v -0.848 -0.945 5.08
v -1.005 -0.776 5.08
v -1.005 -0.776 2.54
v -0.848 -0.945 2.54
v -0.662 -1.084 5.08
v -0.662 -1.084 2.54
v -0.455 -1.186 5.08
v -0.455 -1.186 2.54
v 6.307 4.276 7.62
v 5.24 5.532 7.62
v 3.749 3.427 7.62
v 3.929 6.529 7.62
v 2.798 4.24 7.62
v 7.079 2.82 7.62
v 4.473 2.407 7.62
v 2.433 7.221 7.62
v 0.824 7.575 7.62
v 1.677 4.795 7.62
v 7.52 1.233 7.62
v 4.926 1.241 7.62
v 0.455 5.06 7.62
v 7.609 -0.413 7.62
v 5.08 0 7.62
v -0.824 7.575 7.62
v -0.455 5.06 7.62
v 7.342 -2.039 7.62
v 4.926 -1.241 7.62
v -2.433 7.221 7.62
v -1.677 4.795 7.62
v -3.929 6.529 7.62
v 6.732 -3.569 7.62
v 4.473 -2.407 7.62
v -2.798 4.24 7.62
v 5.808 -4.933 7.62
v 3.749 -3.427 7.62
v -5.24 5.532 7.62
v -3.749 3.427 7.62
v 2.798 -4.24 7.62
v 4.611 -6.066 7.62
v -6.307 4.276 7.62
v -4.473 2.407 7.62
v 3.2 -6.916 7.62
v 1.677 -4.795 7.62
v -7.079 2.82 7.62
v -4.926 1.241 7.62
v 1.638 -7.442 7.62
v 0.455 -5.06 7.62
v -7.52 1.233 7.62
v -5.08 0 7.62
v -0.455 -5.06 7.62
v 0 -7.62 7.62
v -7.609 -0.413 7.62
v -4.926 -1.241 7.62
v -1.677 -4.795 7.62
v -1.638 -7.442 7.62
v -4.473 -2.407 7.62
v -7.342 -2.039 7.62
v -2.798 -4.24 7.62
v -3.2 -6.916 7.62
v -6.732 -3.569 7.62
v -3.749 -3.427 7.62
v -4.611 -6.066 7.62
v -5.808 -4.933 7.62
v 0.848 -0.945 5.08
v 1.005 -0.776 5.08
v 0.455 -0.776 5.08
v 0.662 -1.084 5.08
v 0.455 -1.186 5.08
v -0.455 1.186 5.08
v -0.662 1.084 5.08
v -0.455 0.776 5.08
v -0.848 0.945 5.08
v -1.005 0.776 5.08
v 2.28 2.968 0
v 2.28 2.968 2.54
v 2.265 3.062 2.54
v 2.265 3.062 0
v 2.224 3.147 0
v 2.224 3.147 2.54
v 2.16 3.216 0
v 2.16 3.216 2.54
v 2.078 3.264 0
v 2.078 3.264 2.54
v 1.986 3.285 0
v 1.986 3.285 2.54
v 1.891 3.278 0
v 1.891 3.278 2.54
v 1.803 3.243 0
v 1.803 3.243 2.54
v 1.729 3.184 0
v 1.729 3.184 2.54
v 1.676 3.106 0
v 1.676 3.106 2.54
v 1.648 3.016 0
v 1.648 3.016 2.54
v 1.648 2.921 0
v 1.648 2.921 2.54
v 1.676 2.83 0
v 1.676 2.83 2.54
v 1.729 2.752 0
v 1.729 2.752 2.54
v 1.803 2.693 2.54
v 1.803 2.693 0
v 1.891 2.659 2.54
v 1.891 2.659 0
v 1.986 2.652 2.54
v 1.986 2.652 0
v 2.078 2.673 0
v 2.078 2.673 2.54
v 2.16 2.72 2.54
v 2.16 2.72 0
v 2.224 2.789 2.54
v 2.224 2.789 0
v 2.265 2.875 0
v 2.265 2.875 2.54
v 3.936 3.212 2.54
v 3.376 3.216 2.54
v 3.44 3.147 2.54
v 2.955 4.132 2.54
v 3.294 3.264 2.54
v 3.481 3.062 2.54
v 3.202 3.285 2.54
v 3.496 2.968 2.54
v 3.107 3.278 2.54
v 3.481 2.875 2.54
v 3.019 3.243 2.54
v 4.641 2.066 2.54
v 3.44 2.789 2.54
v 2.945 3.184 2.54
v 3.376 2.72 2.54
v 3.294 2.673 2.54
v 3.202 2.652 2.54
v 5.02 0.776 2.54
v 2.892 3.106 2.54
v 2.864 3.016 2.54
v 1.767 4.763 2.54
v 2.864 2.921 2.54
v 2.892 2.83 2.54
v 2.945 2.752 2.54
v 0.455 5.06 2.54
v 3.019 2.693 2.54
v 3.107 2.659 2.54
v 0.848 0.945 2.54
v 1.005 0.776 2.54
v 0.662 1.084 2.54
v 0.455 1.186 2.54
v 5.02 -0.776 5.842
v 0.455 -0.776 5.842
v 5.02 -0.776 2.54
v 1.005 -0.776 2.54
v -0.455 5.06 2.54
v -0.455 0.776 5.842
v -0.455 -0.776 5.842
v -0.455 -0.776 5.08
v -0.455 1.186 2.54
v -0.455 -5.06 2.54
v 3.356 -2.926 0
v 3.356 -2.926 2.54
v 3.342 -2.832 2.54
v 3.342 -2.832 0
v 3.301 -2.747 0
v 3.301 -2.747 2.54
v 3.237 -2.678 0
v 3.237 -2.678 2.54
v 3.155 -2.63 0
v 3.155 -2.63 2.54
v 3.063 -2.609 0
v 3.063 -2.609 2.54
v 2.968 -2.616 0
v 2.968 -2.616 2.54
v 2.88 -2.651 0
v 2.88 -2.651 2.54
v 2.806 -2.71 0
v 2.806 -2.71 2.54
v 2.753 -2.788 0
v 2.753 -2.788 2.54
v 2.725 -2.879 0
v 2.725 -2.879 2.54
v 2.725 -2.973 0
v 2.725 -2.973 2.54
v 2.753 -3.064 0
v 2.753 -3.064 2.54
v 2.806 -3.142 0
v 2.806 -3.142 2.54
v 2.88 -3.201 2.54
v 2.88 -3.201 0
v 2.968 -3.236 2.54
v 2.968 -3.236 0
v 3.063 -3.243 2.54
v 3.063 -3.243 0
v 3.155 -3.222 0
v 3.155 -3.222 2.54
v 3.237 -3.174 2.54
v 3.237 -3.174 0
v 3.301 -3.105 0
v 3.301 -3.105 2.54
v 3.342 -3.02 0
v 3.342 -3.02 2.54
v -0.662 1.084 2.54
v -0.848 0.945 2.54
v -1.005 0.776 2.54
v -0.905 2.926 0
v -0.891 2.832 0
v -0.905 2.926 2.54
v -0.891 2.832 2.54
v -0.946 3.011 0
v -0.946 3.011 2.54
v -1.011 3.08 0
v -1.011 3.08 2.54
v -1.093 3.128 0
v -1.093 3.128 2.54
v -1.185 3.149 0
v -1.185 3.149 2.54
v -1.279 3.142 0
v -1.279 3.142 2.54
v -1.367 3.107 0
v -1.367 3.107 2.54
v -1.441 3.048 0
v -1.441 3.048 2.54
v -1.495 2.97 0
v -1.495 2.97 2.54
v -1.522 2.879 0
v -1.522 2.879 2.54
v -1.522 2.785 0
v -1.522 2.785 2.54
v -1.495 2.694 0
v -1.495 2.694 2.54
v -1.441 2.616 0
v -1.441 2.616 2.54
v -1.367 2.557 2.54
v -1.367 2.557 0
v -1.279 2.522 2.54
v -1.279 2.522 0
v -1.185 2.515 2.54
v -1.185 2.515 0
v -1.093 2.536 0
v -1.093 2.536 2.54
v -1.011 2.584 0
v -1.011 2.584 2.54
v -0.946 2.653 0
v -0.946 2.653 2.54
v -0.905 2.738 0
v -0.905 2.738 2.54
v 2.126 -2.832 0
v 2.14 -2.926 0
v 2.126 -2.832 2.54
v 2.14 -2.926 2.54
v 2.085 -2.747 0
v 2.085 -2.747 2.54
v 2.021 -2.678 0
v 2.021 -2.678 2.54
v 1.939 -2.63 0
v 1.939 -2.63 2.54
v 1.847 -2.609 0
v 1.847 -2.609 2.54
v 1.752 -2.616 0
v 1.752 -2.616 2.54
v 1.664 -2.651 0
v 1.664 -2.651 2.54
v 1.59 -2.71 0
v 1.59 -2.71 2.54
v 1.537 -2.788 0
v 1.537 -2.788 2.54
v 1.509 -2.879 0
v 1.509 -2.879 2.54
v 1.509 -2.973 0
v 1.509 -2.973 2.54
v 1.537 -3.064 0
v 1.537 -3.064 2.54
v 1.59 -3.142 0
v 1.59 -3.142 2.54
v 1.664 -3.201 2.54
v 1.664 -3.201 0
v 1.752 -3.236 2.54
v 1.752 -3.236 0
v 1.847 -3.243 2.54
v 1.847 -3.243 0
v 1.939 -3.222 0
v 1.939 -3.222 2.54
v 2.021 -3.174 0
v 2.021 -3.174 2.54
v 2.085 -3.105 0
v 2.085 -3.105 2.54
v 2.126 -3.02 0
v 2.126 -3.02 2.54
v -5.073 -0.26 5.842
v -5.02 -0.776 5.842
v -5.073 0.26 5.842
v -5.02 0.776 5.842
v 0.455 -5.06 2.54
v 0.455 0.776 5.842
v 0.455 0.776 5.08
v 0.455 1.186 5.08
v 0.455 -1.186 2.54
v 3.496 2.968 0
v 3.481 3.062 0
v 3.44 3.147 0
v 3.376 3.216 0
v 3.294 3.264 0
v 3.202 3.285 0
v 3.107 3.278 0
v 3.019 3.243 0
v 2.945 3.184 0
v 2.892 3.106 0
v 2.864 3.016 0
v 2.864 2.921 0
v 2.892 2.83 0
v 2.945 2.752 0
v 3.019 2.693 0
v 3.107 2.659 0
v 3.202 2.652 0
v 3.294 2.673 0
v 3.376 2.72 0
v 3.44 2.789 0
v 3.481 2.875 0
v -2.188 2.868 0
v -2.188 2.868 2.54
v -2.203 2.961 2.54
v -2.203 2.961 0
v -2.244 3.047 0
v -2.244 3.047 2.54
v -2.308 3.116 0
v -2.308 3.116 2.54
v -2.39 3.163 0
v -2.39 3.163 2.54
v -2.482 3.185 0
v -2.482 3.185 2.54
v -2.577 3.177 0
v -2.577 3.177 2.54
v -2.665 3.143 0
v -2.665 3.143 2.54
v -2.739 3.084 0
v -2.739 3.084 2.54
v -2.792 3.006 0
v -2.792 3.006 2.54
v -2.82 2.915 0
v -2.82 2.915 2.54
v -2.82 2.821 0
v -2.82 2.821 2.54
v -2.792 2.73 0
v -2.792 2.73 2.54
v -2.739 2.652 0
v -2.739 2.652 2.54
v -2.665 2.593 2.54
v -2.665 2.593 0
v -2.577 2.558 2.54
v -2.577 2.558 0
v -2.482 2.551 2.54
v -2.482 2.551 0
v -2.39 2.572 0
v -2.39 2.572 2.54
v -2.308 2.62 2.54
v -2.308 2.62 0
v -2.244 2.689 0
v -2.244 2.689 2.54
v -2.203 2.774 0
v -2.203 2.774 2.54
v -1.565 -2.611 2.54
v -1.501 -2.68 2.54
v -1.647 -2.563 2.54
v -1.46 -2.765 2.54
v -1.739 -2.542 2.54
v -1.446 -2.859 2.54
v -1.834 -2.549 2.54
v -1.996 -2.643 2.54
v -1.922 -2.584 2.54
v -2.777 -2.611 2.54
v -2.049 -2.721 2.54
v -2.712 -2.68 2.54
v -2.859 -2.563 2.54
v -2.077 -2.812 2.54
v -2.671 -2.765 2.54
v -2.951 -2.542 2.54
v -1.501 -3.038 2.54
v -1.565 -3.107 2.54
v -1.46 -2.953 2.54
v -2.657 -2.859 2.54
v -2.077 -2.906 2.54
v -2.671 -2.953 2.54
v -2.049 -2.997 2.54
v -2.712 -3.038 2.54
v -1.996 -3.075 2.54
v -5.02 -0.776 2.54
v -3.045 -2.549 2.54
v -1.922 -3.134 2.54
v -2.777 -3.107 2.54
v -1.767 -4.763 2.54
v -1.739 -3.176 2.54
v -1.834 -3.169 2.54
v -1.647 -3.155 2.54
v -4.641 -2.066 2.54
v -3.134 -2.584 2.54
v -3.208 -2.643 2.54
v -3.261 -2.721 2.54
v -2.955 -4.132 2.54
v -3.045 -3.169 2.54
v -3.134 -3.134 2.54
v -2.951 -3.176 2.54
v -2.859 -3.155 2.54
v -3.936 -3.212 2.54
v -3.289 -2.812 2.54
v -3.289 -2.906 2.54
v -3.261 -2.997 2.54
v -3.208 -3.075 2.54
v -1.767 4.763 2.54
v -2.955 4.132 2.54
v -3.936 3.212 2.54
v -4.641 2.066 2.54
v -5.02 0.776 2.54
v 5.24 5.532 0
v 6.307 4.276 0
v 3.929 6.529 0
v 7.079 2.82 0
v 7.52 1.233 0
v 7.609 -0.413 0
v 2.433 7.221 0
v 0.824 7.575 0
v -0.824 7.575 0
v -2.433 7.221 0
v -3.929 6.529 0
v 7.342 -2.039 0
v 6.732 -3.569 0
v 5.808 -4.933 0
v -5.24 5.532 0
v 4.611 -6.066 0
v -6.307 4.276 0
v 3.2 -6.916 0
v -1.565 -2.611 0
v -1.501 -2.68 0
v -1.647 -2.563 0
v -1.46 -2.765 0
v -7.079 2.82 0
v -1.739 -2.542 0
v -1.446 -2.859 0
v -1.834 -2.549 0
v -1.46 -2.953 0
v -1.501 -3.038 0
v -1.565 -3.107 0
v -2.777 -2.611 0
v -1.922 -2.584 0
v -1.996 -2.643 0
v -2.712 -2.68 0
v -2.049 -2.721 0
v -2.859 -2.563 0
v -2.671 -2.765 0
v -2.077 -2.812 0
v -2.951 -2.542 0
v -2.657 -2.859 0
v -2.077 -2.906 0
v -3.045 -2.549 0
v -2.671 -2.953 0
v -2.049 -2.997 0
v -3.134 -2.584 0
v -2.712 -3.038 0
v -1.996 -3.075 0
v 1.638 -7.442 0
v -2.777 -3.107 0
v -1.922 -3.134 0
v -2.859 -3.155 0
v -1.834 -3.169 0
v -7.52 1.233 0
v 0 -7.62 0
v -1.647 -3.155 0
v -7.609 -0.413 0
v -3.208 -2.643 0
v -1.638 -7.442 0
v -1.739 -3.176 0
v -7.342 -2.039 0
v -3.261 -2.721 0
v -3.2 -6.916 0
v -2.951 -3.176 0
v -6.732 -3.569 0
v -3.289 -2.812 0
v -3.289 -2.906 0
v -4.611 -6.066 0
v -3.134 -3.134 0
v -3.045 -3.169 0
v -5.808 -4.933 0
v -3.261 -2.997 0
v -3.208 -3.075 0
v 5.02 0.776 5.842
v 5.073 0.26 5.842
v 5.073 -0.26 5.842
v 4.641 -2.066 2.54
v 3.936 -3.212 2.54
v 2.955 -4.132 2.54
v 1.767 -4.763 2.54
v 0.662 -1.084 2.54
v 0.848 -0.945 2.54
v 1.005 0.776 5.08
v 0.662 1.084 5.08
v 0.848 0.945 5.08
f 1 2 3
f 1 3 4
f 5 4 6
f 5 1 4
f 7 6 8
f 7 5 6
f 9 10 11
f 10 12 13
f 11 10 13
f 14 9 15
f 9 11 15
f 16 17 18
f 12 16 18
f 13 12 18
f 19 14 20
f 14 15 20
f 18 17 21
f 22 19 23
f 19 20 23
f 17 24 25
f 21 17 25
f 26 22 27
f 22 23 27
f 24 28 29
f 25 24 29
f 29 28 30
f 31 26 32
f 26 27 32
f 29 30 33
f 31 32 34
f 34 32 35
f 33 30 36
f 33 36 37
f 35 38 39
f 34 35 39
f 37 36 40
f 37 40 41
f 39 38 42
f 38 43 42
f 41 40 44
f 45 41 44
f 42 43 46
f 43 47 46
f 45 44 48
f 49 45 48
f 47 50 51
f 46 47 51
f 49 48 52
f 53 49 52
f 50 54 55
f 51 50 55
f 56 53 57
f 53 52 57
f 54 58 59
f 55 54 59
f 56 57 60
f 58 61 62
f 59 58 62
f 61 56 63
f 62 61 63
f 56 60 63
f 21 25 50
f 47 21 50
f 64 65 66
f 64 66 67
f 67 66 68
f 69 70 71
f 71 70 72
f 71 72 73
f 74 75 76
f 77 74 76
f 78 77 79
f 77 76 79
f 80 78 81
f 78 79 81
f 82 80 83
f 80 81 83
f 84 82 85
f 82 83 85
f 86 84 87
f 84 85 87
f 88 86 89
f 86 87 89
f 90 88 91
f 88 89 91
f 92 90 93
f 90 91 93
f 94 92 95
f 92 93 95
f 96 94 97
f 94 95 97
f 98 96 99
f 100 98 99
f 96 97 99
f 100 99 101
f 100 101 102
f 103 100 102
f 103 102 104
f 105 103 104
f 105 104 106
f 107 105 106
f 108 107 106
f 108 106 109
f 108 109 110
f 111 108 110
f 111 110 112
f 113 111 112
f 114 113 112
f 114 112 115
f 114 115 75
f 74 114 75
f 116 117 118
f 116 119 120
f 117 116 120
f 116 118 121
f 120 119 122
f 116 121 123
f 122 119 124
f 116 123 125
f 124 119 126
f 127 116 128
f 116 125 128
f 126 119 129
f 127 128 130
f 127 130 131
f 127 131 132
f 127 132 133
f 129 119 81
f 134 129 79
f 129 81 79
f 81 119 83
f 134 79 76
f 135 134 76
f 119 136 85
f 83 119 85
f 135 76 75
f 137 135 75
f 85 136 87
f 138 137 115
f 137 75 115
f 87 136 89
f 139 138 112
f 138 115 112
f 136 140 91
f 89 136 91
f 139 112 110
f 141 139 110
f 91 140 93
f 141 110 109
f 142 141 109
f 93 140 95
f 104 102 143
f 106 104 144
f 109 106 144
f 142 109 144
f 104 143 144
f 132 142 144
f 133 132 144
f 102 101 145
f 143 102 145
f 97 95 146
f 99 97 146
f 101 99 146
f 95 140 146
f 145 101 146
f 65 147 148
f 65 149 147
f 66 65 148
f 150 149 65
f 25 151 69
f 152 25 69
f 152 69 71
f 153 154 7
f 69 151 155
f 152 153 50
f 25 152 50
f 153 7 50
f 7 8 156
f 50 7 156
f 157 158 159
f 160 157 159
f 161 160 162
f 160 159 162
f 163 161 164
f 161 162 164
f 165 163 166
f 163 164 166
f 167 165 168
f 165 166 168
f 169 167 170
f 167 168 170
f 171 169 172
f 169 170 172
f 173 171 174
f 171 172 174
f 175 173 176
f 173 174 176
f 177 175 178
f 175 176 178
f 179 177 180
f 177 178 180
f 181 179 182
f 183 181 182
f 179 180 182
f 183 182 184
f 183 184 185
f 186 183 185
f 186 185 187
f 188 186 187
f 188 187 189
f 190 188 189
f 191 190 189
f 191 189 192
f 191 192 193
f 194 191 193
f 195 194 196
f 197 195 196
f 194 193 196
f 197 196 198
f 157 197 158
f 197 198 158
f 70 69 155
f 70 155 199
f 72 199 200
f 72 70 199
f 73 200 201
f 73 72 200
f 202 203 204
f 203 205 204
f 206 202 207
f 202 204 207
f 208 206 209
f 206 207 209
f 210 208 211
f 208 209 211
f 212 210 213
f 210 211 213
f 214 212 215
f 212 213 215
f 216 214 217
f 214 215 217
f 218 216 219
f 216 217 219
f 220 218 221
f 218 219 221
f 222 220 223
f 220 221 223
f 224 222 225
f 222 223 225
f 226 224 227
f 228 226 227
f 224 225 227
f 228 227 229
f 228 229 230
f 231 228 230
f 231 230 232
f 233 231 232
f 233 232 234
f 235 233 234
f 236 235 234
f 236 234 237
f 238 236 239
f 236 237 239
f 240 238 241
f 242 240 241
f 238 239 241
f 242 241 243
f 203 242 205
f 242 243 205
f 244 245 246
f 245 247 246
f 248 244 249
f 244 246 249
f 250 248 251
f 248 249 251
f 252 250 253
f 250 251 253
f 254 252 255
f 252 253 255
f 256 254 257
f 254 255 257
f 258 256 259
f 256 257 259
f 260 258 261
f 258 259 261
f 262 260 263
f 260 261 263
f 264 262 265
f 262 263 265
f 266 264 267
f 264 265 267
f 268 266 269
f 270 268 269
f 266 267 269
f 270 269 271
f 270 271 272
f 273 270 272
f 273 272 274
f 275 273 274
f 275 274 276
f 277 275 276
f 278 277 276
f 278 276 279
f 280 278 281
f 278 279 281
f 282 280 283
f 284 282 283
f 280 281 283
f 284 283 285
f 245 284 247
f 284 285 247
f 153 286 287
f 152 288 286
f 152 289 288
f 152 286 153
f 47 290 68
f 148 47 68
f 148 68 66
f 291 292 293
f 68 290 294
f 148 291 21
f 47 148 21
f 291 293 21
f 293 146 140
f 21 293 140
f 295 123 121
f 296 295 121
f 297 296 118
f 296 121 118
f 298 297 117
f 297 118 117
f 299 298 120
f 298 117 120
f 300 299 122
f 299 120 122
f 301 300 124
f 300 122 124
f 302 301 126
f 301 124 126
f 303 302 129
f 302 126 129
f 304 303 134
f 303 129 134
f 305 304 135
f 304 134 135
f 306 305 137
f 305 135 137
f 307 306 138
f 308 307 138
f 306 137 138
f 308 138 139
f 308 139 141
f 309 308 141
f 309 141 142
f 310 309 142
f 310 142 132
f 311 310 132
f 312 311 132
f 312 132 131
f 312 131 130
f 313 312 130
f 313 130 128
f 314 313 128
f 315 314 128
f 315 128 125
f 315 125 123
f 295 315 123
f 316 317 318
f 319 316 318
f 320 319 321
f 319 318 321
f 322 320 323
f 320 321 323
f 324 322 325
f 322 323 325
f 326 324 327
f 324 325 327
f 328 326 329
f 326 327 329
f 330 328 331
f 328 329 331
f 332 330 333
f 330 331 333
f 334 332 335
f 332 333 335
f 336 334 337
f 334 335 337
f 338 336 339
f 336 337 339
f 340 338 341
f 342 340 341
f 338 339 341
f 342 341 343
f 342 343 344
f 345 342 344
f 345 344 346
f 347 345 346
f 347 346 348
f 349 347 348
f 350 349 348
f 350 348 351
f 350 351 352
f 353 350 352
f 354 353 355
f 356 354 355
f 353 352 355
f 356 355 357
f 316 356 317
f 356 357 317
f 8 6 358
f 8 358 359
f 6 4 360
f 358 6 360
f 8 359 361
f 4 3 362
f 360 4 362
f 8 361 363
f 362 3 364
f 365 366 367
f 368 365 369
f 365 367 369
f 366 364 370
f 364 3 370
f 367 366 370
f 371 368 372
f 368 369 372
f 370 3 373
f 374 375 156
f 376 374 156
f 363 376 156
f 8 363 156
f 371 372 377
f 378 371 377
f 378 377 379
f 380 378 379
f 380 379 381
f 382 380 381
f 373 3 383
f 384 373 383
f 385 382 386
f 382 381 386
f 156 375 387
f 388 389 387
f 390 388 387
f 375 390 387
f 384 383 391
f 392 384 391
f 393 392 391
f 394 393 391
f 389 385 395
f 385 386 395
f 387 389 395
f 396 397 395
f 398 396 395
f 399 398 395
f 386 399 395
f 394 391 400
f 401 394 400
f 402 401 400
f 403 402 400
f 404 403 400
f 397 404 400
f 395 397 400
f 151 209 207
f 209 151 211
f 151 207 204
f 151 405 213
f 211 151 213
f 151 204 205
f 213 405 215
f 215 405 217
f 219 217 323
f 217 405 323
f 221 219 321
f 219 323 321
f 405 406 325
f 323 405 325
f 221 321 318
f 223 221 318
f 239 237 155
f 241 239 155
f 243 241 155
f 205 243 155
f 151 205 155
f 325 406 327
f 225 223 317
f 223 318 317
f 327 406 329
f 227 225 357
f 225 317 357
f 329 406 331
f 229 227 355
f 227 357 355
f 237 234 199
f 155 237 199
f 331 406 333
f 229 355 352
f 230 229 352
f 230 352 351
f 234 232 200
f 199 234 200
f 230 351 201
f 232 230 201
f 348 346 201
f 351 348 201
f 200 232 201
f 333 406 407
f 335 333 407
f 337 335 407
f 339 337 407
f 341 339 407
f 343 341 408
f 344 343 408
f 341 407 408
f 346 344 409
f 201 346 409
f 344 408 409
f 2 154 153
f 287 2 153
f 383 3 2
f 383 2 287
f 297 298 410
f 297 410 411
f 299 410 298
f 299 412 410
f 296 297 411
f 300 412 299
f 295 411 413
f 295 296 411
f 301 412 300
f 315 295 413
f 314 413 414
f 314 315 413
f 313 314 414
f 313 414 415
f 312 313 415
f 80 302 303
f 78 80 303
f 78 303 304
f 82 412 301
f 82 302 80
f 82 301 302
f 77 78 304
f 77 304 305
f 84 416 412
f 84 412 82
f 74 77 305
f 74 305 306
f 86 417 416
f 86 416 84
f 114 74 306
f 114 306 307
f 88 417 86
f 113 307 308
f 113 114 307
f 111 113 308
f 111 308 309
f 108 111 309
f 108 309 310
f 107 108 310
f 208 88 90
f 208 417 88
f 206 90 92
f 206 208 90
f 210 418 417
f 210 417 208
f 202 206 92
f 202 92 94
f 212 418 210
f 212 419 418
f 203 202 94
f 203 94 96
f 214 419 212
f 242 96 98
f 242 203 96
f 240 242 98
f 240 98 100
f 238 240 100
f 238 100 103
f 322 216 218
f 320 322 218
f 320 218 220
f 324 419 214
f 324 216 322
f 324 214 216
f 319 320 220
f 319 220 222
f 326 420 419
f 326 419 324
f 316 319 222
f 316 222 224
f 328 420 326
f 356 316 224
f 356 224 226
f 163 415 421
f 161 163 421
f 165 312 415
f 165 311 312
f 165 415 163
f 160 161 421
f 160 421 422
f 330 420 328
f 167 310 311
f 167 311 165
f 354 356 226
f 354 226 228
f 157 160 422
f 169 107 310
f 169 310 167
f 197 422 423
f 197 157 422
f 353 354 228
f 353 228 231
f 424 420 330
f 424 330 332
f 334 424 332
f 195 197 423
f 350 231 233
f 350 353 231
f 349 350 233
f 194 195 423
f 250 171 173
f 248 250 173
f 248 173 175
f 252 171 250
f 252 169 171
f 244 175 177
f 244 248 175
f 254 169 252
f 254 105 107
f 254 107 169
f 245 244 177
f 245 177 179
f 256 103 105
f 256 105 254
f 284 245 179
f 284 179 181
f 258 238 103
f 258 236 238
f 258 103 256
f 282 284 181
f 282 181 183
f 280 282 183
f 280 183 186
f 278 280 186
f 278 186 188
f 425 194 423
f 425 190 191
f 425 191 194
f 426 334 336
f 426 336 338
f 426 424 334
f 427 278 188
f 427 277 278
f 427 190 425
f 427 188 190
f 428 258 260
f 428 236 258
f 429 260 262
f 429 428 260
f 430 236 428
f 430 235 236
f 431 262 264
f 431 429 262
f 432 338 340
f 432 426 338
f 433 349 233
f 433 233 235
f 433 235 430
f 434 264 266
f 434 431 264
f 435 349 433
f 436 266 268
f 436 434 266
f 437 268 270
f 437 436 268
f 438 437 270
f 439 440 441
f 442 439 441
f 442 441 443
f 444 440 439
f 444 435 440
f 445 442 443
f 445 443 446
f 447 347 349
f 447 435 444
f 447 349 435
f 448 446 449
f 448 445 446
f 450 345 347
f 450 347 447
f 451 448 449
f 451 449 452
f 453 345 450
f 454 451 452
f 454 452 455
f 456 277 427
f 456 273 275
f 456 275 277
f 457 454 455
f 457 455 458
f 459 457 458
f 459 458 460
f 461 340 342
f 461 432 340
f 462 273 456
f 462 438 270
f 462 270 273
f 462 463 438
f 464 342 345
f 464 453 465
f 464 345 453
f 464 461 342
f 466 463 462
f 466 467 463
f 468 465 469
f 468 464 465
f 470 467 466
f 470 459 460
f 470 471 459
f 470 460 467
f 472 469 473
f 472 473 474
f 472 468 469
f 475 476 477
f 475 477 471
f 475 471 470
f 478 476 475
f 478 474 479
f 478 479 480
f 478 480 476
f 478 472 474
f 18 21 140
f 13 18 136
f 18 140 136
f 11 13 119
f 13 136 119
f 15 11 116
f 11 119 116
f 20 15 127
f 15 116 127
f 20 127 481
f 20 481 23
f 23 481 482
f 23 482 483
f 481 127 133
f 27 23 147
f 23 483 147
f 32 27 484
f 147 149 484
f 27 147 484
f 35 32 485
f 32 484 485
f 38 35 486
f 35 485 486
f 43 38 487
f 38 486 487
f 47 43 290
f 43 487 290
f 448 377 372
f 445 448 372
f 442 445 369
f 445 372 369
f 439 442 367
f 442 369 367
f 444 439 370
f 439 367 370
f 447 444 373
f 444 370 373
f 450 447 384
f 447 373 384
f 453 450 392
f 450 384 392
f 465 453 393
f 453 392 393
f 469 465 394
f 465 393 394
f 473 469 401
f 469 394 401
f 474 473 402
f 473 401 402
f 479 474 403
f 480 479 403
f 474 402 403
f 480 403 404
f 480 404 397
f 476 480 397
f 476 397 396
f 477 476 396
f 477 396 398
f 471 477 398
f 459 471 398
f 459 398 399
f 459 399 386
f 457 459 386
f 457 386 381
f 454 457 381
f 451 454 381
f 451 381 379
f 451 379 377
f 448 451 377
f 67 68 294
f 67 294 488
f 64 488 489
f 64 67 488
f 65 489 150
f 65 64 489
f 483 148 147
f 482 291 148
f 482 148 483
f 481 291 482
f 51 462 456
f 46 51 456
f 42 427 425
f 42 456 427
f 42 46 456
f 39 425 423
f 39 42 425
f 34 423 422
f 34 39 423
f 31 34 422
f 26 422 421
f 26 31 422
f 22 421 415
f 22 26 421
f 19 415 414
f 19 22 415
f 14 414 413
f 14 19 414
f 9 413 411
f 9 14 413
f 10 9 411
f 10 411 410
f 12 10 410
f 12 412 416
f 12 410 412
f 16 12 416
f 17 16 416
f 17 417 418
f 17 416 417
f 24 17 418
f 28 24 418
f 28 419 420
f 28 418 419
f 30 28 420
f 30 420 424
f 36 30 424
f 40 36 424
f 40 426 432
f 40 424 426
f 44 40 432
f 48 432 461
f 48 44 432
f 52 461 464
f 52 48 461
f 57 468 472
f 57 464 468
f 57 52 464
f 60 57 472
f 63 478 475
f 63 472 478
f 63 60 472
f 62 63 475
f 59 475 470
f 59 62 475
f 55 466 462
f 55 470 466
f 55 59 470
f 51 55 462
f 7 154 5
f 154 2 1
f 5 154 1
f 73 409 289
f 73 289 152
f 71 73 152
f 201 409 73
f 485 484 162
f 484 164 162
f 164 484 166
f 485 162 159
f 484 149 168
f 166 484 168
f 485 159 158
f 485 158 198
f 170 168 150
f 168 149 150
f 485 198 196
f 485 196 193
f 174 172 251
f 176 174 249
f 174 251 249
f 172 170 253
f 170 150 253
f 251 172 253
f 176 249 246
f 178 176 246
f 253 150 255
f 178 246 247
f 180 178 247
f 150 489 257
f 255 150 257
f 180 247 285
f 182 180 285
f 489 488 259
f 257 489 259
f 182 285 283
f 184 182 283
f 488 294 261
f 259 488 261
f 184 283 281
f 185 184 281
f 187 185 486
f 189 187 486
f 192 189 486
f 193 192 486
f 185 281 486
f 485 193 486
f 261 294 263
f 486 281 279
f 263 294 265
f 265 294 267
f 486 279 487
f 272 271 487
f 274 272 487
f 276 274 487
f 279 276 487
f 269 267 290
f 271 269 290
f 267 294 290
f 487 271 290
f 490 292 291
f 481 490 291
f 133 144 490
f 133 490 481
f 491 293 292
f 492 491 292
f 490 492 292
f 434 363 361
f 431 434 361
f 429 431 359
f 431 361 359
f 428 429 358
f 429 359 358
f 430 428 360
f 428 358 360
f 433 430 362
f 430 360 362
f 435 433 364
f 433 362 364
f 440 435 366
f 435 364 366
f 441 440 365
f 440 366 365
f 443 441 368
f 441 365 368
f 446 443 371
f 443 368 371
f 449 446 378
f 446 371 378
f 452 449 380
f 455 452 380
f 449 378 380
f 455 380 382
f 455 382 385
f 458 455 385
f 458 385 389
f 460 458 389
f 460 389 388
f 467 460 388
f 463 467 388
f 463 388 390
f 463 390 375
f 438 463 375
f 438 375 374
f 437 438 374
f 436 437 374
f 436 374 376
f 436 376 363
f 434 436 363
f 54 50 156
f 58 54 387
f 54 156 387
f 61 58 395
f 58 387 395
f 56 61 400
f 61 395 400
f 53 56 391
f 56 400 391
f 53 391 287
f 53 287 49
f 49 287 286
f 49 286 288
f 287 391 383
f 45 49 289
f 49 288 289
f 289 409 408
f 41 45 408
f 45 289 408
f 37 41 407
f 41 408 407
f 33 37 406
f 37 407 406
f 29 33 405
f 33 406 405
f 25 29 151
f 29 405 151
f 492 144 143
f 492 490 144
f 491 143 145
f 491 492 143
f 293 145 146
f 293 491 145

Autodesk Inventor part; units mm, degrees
ref_plane "YZ Plane" through (0, 0, 0) normal (1, 0, 0) x (0, 1, 0)
ref_plane "XZ Plane" through (0, 0, 0) normal (0, 1, 0) x (-1, 0, 0)
ref_plane "XY Plane" through (0, 0, 0) normal (0, 0, 1) x (1, 0, 0)
sketch "Sketch1" plane through (0, 0, 0) normal (1, 0, 0) x (0, 1, 0)
  line L0 (-7.62, 2.54) -> (0, 2.54)
  line L1 (0, 2.54) -> (0, 0)
  line L2 (0, 0) -> (-7.62, 0)
  line L3 (-7.62, 0) -> (-7.62, 2.54)
  line L4 (-7.62, 7.62) -> (-5.08, 7.62)
  line L5 (-5.08, 7.62) -> (-5.08, 2.54)
  line L6 (-5.08, 2.54) -> (-7.62, 2.54)
  line L7 (-7.62, 2.54) -> (-7.62, 7.62)
  line L8 (-1.27, 5.08) -> (0, 5.08)
  line L9 (0, 5.08) -> (0, 2.54)
  line L10 (0, 2.54) -> (-1.27, 2.54)
  line L11 (-1.27, 2.54) -> (-1.27, 5.08)
  dimension "d0" = 7.62
  dimension "d1" = 2.54
  dimension "d2" = 5.08
  dimension "d3" = 2.54
  dimension "d4" = 1.27
  dimension "d5" = 2.54
revolve "Revolution1" add sketch "Sketch1" angle 360 about axis through (0, 0, 2.54) along (0, 0, -1)
sketch "Sketch2" plane through (0, 0, 2.54) normal (0, 0, 1) x (1, 0, 0)
  circle A0 centre (-2.9748, -2.859) radius 0.3175
  line L0 (-0.6666, -1.081) -> (-1.7631, -2.859) construction
  line L1 (-1.7631, -2.859) -> (-2.9748, -2.859) construction
  circle A1 centre (0, 0) radius 1.27 construction
  circle A2 centre (-1.7631, -2.859) radius 0.3175
  point P0 (0, 0)
  dimension "d7" = 0.635
  dimension "d8" = 1.778
  dimension "d9" = 0.635
extrude "Extrusion1" cut sketch "Sketch2" along normal mid plane 25.4
sketch "Sketch3" plane through (0, 0, 2.54) normal (0, 0, 1) x (1, 0, 0)
  line L0 (0, 0) -> (1.8228, -2.926) construction
  line L1 (1.8228, -2.926) -> (3.0389, -2.926) construction
  line L2 (-1.5657, -3.1077) -> (1.8228, -2.926) construction
  circle A0 centre (-1.7631, -2.859) radius 0.3175 projected
  circle A1 centre (1.8228, -2.926) radius 0.3175
  circle A2 centre (3.0389, -2.926) radius 0.3175
  circle A3 centre (1.962, 2.9682) radius 0.3175
  circle A4 centre (3.1781, 2.9682) radius 0.3175
  circle A5 centre (-1.2085, 2.832) radius 0.3175
  circle A6 centre (-2.506, 2.8679) radius 0.3175
  point P0 (0, 0)
  dimension "d12" = 0.635
  dimension "d13" = 0.635
  dimension "d14" = 0.635
  dimension "d15" = 0.635
  dimension "d16" = 0.635
  dimension "d17" = 0.635
extrude "Extrusion2" cut sketch "Sketch3" along normal mid plane 25.4 contours A1 | A2 | A3 | A4 | A5 | A6
sketch "Sketch4" plane through (0, 0, 2.54) normal (0, 0, 1) x (1, 0, 0)
  line L0 (-0.4549, -6.2616) -> (0.4549, -6.2616)
  line L1 (0.4549, -6.2616) -> (0.4549, 6.2616)
  line L2 (0.4549, 6.2616) -> (-0.4549, 6.2616)
  line L3 (-0.4549, 6.2616) -> (-0.4549, -6.2616)
  line L4 (-0.4549, -6.2616) -> (0.4549, 6.2616) construction
  line L5 (0.4549, -6.2616) -> (-0.4549, 6.2616) construction
  point P0 (0, 0)
  point P1 (0, 0)
extrude "Extrusion3" add sketch "Sketch4" along normal blind 5.08
sketch "Sketch5" plane through (0, 0, 2.54) normal (0, 0, 1) x (1, 0, 0)
  line L0 (-6.9573, 0.776) -> (6.9573, 0.776)
  line L1 (6.9573, 0.776) -> (6.9573, -0.776)
  line L2 (6.9573, -0.776) -> (-6.9573, -0.776)
  line L3 (-6.9573, -0.776) -> (-6.9573, 0.776)
  line L4 (-6.9573, 0.776) -> (6.9573, -0.776) construction
  line L5 (6.9573, 0.776) -> (-6.9573, -0.776) construction
  point P0 (0, 0)
  point P1 (0, 0)
extrude "Extrusion4" add sketch "Sketch5" along normal blind 3.302
properties part number "Mount"
